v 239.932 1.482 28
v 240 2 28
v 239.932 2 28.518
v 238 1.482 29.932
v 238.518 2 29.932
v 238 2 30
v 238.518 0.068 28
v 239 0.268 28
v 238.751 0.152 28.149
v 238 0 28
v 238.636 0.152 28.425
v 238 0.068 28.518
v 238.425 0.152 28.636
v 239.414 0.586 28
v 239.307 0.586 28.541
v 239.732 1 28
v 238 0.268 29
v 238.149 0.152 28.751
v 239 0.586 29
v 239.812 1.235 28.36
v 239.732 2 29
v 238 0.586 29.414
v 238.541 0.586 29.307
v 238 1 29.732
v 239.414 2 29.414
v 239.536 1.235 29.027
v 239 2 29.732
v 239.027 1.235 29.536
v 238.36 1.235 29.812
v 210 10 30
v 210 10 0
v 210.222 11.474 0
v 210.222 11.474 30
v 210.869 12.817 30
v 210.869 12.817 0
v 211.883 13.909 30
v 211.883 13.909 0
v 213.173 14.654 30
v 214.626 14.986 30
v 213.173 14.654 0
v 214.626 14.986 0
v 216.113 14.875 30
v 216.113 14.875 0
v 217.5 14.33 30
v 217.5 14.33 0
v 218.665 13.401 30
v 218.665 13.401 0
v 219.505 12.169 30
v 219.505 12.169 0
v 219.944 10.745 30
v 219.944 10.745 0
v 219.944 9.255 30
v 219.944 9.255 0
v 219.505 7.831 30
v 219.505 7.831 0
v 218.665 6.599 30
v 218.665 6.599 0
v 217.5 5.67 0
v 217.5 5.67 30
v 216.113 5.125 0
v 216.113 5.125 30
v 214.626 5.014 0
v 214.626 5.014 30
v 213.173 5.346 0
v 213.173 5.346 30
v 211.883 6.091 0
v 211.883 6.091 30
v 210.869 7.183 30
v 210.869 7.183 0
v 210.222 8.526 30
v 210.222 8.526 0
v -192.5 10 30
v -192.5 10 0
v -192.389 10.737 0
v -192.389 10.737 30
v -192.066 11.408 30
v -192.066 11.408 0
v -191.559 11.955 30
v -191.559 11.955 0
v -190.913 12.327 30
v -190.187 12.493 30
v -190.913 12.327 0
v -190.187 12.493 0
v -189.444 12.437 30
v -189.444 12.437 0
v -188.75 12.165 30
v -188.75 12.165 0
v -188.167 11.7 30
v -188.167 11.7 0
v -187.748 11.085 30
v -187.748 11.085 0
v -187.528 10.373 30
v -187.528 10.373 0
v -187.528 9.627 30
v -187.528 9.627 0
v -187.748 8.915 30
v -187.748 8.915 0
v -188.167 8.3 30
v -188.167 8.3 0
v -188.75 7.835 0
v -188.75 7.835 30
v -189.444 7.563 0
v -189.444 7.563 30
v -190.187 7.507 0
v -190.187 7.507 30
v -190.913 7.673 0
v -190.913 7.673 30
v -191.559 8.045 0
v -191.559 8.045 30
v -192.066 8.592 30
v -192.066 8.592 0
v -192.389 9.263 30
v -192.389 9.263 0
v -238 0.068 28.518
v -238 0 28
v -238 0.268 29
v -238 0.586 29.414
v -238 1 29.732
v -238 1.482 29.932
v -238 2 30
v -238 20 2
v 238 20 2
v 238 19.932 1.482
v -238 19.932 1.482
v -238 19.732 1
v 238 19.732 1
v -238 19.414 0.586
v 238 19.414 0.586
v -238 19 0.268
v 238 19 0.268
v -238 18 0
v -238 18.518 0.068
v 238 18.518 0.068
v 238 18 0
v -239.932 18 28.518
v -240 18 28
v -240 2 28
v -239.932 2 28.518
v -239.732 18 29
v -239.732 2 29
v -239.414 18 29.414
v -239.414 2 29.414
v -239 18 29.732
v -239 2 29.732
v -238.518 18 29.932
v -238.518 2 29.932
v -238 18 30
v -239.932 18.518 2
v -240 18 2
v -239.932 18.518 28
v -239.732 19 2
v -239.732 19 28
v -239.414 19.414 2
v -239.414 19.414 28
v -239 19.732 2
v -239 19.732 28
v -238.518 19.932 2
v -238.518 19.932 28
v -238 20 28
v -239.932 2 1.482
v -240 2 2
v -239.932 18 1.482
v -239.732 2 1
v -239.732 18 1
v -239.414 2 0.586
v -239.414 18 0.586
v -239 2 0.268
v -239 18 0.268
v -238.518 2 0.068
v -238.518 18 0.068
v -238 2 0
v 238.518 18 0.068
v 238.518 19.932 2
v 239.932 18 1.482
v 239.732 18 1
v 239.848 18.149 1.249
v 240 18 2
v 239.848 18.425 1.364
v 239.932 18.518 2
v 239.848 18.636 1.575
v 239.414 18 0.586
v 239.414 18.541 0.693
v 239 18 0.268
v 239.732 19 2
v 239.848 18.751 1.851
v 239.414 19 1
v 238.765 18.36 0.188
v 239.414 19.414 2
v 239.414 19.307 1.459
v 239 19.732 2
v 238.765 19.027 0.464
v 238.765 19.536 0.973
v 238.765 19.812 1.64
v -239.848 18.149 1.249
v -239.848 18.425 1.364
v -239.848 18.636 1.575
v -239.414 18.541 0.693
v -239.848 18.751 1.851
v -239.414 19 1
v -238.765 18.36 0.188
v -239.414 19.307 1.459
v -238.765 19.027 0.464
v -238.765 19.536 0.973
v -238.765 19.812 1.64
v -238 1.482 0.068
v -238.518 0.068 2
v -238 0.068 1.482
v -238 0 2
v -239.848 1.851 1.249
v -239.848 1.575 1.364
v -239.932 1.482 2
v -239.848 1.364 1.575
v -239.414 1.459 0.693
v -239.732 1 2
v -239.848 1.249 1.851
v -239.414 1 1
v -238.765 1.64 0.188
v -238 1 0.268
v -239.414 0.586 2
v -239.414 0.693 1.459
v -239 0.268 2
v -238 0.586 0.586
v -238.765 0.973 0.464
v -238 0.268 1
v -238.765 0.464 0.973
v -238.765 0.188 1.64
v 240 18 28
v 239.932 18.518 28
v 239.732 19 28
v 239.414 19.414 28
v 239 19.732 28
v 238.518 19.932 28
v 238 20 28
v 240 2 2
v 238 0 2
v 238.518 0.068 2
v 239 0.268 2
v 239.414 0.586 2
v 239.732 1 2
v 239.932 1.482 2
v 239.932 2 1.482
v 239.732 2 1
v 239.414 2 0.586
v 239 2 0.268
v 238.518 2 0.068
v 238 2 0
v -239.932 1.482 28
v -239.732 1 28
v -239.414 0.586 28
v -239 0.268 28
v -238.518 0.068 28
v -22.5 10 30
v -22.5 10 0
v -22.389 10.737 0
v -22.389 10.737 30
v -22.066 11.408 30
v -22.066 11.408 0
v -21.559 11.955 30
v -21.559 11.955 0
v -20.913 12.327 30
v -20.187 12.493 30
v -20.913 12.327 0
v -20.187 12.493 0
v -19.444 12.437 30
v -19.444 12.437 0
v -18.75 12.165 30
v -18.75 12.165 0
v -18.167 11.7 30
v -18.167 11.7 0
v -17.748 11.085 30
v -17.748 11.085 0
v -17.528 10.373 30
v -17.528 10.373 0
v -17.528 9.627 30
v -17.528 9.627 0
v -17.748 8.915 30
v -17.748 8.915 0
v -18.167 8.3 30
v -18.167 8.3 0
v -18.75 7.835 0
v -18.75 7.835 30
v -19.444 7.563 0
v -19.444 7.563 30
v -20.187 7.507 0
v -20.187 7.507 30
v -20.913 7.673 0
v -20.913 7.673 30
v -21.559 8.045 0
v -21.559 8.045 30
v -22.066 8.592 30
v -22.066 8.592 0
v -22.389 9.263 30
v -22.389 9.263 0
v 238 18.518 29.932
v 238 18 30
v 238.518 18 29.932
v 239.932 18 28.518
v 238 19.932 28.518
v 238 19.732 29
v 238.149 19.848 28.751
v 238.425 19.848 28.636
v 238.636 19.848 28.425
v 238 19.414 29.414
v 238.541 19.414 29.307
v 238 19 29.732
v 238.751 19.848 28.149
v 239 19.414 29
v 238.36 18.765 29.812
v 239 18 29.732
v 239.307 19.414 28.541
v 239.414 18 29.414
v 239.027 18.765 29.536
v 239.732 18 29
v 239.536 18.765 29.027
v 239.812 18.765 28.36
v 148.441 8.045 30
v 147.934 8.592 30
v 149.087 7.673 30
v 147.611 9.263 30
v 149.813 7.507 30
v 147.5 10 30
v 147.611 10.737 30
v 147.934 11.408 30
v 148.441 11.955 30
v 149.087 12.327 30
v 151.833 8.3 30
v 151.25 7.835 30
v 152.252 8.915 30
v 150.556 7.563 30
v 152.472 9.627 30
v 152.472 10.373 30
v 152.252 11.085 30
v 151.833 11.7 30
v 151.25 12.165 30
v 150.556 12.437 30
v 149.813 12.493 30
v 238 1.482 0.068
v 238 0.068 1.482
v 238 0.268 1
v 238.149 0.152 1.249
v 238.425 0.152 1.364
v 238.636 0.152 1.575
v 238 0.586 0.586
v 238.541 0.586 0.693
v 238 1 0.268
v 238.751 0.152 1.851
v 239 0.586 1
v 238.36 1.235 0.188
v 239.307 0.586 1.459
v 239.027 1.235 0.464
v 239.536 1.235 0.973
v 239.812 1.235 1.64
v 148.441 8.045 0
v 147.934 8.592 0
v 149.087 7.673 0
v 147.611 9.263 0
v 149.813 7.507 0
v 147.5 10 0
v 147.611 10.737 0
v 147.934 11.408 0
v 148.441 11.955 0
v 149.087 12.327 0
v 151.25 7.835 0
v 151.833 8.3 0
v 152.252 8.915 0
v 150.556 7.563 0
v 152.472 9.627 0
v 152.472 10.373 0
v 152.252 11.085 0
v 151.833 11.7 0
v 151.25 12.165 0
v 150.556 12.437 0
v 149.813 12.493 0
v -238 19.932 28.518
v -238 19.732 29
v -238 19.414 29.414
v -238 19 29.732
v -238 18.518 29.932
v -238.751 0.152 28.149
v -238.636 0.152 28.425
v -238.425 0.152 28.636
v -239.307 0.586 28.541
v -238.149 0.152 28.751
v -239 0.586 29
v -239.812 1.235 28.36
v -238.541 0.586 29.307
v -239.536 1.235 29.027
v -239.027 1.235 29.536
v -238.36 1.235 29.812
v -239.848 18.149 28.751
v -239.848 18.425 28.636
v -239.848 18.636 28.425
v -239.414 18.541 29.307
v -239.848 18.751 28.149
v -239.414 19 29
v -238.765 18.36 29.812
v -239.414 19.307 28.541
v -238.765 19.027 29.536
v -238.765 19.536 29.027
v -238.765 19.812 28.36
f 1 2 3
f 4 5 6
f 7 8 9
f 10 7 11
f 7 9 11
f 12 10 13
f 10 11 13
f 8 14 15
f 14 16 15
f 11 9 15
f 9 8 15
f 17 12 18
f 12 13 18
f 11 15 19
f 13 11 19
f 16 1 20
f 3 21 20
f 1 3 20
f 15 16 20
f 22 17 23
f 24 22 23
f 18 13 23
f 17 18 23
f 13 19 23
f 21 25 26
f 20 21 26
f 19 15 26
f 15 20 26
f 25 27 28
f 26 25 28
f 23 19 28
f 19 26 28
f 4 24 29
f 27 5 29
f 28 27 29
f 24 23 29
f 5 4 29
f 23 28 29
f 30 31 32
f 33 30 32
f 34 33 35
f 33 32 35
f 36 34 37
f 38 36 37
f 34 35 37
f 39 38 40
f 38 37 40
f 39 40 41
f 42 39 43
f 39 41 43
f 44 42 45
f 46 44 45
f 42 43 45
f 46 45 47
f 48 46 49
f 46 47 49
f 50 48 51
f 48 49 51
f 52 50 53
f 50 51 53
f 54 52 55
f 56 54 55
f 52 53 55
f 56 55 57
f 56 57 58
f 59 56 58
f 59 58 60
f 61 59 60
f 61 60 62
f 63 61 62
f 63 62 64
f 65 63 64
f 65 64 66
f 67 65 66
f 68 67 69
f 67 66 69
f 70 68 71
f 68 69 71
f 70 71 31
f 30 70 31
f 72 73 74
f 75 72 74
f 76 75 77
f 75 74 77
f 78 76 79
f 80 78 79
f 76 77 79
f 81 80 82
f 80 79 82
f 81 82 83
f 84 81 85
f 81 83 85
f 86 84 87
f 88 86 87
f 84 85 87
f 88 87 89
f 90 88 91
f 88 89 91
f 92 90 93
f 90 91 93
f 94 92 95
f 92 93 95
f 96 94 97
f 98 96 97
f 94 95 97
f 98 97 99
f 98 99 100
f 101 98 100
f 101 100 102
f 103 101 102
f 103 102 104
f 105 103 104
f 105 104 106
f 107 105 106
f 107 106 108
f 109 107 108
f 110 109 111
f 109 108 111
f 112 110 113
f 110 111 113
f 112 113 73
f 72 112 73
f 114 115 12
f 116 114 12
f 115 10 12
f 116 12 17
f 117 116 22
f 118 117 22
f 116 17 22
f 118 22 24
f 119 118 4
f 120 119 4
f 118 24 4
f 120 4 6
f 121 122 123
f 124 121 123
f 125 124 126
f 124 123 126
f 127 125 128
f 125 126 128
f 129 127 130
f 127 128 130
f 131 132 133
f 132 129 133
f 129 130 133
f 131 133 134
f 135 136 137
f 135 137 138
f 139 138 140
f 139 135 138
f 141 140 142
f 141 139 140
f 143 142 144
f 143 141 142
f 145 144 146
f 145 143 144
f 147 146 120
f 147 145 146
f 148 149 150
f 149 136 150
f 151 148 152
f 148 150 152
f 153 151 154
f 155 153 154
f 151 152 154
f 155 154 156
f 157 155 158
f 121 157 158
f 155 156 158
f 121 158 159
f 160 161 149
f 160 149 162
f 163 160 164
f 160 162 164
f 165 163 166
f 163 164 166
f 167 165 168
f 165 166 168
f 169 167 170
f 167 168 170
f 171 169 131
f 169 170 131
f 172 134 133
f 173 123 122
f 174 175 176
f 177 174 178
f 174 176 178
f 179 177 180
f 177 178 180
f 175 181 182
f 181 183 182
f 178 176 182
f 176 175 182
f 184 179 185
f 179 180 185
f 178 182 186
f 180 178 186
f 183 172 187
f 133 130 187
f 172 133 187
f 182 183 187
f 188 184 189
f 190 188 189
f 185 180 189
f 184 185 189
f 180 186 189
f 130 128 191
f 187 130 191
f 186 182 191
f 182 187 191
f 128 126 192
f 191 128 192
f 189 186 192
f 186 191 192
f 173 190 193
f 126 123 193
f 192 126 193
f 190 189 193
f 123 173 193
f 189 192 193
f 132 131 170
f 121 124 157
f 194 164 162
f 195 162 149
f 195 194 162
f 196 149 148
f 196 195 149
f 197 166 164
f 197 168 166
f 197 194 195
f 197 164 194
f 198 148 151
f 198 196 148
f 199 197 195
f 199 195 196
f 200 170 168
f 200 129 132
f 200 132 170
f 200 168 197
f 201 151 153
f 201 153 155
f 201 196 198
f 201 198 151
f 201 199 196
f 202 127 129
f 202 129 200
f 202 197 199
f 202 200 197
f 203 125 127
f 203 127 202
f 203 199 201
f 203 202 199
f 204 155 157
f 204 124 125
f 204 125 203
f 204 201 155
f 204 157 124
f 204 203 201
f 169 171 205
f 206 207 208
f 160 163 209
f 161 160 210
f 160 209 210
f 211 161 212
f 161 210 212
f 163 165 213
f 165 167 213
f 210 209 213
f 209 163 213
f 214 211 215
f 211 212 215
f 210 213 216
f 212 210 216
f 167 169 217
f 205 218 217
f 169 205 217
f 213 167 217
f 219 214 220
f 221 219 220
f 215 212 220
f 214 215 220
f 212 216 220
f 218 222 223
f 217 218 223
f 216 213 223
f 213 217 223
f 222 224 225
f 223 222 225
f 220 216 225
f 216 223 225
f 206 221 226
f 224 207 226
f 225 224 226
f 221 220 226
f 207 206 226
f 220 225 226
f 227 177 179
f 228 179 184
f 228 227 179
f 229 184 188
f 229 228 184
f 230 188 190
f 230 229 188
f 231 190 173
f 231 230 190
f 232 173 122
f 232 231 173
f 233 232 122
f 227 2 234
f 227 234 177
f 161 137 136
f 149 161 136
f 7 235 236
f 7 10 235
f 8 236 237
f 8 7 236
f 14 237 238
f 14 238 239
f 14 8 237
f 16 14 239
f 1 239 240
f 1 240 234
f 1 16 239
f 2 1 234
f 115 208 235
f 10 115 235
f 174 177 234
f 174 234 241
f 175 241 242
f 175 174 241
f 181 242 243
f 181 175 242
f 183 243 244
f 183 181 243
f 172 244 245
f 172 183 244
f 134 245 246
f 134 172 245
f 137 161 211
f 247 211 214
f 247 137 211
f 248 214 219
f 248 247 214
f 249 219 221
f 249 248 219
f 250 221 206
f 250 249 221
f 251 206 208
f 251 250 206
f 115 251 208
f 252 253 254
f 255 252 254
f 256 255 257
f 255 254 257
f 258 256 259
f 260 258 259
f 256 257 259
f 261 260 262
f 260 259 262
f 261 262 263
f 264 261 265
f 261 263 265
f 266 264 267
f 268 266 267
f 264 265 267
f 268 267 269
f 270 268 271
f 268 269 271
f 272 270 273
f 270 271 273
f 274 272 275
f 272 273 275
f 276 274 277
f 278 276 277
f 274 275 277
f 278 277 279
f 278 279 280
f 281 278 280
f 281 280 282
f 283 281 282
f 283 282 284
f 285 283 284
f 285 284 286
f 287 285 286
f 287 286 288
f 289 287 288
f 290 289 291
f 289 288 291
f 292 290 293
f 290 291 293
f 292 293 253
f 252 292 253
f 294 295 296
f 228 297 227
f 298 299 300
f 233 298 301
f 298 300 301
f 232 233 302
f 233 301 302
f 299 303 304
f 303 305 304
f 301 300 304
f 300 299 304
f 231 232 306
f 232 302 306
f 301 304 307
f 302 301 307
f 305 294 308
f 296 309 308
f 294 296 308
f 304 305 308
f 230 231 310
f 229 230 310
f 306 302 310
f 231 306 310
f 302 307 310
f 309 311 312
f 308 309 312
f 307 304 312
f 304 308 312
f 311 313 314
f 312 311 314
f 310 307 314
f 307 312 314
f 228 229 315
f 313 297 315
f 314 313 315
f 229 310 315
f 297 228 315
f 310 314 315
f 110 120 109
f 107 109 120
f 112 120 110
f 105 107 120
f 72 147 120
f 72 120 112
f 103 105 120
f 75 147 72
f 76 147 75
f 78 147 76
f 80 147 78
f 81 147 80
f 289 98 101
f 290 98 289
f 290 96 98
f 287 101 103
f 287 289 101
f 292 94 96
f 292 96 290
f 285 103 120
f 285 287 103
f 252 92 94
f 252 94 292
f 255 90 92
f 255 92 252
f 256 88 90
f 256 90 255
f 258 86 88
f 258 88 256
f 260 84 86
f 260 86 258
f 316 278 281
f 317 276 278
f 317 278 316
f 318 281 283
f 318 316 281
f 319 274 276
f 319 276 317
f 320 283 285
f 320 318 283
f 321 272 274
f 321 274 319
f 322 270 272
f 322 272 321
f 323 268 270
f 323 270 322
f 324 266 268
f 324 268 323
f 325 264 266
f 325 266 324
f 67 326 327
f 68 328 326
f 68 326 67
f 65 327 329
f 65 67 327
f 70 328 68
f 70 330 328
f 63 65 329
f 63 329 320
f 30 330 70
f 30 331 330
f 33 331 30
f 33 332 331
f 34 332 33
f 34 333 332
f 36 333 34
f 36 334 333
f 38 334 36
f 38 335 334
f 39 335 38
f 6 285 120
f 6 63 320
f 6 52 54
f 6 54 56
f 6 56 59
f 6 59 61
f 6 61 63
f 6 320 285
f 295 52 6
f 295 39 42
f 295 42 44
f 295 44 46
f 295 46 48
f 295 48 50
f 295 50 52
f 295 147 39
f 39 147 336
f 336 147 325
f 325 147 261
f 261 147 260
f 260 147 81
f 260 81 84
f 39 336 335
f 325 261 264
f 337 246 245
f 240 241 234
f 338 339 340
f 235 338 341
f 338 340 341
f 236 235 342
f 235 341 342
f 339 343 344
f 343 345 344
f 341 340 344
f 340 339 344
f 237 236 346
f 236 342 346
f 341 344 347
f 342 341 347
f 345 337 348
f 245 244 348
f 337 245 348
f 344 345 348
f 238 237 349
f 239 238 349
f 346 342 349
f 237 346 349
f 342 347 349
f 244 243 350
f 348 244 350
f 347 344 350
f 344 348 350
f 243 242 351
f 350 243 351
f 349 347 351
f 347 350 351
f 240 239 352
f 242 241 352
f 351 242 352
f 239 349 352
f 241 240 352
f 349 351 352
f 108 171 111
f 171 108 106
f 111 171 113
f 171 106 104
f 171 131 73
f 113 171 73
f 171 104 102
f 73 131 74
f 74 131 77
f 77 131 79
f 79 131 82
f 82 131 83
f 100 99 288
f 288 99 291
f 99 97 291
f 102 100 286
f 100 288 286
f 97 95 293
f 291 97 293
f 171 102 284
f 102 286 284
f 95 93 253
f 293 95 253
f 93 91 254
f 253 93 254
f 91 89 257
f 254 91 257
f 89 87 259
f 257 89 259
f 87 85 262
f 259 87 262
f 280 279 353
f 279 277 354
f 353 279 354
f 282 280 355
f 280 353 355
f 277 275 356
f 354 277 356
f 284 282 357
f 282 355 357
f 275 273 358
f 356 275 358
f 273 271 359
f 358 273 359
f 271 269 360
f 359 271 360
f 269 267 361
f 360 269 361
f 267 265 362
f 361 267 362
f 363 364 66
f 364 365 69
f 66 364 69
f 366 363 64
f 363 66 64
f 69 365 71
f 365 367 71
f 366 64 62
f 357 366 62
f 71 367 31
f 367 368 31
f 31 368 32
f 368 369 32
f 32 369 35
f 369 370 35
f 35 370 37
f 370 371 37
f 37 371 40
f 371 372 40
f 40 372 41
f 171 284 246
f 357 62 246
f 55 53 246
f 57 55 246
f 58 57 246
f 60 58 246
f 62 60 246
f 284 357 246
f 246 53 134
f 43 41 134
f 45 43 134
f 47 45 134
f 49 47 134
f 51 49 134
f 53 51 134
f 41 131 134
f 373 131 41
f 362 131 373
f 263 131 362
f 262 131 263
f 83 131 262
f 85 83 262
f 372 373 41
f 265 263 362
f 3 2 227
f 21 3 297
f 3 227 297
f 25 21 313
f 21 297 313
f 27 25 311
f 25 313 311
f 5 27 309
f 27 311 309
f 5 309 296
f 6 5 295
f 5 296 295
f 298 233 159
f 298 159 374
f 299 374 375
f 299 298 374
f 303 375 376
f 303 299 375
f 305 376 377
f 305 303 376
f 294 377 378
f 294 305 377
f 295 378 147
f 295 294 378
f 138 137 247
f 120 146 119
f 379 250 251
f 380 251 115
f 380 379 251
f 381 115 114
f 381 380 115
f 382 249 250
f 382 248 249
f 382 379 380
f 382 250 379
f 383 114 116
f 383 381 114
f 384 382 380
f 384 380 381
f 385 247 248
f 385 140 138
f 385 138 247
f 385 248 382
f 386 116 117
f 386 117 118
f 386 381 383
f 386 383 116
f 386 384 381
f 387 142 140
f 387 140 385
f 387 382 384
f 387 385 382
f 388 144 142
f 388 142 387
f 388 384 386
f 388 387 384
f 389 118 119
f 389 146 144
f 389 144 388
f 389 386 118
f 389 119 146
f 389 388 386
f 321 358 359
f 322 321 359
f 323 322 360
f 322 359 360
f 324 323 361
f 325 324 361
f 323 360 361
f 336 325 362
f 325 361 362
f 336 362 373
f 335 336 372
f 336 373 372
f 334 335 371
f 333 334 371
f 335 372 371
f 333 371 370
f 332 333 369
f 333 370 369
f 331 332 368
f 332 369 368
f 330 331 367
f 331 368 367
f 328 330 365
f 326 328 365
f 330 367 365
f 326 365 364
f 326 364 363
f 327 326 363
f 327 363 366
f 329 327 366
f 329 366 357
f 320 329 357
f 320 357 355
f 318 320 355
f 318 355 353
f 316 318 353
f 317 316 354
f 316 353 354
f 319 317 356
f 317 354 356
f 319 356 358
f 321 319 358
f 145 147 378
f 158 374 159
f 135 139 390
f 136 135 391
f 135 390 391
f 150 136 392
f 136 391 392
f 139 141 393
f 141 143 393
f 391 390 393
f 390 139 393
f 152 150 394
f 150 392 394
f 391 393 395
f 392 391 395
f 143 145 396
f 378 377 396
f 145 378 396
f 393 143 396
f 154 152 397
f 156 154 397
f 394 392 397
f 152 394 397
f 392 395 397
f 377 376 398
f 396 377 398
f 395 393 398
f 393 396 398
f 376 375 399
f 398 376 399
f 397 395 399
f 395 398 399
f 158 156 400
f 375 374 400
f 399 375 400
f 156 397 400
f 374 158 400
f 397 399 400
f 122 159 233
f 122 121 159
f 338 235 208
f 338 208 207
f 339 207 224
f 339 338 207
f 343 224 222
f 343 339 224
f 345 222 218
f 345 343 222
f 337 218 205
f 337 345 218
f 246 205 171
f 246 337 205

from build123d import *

# Parameters (mm, degrees)
SKETCH1_W           = 480
SKETCH1_H           = 20
BOSS_EXTRUDE1_DEPTH = 30
FILLET1_R           = 2
SKETCH2_R           = 5
CUT_EXTRUDE1_DEPTH  = 30
SKETCH7_R           = 2.5
CUT_EXTRUDE4_DEPTH  = 30


with BuildPart() as part:
    # Sketch1 → Boss-Extrude1 (new body)
    with BuildSketch(Plane.XY):
        with Locations((0, 10)):
            Rectangle(SKETCH1_W, SKETCH1_H)
    extrude(amount=BOSS_EXTRUDE1_DEPTH)

    # Fillet1
    fillet1_edges = [part.edges().sort_by_distance(p)[0] for p in [
        (240, 10, 30),
        (0, 20, 30),
        (-240, 10, 30),
        (0, 20, 0),
        (240, 10, 0),
        (0, 0, 0),
        (-240, 10, 0),
        (-240, 20, 15),
        (240, 20, 15),
        (240, 0, 15),
        (-240, 0, 15),
        (0, 0, 30),
    ]]
    fillet(fillet1_edges, radius=FILLET1_R)

    # Sketch2 → Cut-Extrude1 (cut)
    with BuildSketch(Plane(origin=(0, 0, 0), x_dir=(-1, 0, 0), z_dir=(0, 0, -1))):
        with Locations((-215, 10)):
            Circle(SKETCH2_R)
    extrude(amount=-CUT_EXTRUDE1_DEPTH, mode=Mode.SUBTRACT)

    # Sketch7 → Cut-Extrude4 (cut)
    with BuildSketch(Plane(origin=(0, 0, 0), x_dir=(-1, 0, 0), z_dir=(0, 0, -1))):
        with Locations((-150, 10)):
            Circle(SKETCH7_R)
        with Locations((20, 10)):
            Circle(SKETCH7_R)
        with Locations((190, 10)):
            Circle(SKETCH7_R)
    extrude(amount=-CUT_EXTRUDE4_DEPTH, mode=Mode.SUBTRACT)


solid = part.part
